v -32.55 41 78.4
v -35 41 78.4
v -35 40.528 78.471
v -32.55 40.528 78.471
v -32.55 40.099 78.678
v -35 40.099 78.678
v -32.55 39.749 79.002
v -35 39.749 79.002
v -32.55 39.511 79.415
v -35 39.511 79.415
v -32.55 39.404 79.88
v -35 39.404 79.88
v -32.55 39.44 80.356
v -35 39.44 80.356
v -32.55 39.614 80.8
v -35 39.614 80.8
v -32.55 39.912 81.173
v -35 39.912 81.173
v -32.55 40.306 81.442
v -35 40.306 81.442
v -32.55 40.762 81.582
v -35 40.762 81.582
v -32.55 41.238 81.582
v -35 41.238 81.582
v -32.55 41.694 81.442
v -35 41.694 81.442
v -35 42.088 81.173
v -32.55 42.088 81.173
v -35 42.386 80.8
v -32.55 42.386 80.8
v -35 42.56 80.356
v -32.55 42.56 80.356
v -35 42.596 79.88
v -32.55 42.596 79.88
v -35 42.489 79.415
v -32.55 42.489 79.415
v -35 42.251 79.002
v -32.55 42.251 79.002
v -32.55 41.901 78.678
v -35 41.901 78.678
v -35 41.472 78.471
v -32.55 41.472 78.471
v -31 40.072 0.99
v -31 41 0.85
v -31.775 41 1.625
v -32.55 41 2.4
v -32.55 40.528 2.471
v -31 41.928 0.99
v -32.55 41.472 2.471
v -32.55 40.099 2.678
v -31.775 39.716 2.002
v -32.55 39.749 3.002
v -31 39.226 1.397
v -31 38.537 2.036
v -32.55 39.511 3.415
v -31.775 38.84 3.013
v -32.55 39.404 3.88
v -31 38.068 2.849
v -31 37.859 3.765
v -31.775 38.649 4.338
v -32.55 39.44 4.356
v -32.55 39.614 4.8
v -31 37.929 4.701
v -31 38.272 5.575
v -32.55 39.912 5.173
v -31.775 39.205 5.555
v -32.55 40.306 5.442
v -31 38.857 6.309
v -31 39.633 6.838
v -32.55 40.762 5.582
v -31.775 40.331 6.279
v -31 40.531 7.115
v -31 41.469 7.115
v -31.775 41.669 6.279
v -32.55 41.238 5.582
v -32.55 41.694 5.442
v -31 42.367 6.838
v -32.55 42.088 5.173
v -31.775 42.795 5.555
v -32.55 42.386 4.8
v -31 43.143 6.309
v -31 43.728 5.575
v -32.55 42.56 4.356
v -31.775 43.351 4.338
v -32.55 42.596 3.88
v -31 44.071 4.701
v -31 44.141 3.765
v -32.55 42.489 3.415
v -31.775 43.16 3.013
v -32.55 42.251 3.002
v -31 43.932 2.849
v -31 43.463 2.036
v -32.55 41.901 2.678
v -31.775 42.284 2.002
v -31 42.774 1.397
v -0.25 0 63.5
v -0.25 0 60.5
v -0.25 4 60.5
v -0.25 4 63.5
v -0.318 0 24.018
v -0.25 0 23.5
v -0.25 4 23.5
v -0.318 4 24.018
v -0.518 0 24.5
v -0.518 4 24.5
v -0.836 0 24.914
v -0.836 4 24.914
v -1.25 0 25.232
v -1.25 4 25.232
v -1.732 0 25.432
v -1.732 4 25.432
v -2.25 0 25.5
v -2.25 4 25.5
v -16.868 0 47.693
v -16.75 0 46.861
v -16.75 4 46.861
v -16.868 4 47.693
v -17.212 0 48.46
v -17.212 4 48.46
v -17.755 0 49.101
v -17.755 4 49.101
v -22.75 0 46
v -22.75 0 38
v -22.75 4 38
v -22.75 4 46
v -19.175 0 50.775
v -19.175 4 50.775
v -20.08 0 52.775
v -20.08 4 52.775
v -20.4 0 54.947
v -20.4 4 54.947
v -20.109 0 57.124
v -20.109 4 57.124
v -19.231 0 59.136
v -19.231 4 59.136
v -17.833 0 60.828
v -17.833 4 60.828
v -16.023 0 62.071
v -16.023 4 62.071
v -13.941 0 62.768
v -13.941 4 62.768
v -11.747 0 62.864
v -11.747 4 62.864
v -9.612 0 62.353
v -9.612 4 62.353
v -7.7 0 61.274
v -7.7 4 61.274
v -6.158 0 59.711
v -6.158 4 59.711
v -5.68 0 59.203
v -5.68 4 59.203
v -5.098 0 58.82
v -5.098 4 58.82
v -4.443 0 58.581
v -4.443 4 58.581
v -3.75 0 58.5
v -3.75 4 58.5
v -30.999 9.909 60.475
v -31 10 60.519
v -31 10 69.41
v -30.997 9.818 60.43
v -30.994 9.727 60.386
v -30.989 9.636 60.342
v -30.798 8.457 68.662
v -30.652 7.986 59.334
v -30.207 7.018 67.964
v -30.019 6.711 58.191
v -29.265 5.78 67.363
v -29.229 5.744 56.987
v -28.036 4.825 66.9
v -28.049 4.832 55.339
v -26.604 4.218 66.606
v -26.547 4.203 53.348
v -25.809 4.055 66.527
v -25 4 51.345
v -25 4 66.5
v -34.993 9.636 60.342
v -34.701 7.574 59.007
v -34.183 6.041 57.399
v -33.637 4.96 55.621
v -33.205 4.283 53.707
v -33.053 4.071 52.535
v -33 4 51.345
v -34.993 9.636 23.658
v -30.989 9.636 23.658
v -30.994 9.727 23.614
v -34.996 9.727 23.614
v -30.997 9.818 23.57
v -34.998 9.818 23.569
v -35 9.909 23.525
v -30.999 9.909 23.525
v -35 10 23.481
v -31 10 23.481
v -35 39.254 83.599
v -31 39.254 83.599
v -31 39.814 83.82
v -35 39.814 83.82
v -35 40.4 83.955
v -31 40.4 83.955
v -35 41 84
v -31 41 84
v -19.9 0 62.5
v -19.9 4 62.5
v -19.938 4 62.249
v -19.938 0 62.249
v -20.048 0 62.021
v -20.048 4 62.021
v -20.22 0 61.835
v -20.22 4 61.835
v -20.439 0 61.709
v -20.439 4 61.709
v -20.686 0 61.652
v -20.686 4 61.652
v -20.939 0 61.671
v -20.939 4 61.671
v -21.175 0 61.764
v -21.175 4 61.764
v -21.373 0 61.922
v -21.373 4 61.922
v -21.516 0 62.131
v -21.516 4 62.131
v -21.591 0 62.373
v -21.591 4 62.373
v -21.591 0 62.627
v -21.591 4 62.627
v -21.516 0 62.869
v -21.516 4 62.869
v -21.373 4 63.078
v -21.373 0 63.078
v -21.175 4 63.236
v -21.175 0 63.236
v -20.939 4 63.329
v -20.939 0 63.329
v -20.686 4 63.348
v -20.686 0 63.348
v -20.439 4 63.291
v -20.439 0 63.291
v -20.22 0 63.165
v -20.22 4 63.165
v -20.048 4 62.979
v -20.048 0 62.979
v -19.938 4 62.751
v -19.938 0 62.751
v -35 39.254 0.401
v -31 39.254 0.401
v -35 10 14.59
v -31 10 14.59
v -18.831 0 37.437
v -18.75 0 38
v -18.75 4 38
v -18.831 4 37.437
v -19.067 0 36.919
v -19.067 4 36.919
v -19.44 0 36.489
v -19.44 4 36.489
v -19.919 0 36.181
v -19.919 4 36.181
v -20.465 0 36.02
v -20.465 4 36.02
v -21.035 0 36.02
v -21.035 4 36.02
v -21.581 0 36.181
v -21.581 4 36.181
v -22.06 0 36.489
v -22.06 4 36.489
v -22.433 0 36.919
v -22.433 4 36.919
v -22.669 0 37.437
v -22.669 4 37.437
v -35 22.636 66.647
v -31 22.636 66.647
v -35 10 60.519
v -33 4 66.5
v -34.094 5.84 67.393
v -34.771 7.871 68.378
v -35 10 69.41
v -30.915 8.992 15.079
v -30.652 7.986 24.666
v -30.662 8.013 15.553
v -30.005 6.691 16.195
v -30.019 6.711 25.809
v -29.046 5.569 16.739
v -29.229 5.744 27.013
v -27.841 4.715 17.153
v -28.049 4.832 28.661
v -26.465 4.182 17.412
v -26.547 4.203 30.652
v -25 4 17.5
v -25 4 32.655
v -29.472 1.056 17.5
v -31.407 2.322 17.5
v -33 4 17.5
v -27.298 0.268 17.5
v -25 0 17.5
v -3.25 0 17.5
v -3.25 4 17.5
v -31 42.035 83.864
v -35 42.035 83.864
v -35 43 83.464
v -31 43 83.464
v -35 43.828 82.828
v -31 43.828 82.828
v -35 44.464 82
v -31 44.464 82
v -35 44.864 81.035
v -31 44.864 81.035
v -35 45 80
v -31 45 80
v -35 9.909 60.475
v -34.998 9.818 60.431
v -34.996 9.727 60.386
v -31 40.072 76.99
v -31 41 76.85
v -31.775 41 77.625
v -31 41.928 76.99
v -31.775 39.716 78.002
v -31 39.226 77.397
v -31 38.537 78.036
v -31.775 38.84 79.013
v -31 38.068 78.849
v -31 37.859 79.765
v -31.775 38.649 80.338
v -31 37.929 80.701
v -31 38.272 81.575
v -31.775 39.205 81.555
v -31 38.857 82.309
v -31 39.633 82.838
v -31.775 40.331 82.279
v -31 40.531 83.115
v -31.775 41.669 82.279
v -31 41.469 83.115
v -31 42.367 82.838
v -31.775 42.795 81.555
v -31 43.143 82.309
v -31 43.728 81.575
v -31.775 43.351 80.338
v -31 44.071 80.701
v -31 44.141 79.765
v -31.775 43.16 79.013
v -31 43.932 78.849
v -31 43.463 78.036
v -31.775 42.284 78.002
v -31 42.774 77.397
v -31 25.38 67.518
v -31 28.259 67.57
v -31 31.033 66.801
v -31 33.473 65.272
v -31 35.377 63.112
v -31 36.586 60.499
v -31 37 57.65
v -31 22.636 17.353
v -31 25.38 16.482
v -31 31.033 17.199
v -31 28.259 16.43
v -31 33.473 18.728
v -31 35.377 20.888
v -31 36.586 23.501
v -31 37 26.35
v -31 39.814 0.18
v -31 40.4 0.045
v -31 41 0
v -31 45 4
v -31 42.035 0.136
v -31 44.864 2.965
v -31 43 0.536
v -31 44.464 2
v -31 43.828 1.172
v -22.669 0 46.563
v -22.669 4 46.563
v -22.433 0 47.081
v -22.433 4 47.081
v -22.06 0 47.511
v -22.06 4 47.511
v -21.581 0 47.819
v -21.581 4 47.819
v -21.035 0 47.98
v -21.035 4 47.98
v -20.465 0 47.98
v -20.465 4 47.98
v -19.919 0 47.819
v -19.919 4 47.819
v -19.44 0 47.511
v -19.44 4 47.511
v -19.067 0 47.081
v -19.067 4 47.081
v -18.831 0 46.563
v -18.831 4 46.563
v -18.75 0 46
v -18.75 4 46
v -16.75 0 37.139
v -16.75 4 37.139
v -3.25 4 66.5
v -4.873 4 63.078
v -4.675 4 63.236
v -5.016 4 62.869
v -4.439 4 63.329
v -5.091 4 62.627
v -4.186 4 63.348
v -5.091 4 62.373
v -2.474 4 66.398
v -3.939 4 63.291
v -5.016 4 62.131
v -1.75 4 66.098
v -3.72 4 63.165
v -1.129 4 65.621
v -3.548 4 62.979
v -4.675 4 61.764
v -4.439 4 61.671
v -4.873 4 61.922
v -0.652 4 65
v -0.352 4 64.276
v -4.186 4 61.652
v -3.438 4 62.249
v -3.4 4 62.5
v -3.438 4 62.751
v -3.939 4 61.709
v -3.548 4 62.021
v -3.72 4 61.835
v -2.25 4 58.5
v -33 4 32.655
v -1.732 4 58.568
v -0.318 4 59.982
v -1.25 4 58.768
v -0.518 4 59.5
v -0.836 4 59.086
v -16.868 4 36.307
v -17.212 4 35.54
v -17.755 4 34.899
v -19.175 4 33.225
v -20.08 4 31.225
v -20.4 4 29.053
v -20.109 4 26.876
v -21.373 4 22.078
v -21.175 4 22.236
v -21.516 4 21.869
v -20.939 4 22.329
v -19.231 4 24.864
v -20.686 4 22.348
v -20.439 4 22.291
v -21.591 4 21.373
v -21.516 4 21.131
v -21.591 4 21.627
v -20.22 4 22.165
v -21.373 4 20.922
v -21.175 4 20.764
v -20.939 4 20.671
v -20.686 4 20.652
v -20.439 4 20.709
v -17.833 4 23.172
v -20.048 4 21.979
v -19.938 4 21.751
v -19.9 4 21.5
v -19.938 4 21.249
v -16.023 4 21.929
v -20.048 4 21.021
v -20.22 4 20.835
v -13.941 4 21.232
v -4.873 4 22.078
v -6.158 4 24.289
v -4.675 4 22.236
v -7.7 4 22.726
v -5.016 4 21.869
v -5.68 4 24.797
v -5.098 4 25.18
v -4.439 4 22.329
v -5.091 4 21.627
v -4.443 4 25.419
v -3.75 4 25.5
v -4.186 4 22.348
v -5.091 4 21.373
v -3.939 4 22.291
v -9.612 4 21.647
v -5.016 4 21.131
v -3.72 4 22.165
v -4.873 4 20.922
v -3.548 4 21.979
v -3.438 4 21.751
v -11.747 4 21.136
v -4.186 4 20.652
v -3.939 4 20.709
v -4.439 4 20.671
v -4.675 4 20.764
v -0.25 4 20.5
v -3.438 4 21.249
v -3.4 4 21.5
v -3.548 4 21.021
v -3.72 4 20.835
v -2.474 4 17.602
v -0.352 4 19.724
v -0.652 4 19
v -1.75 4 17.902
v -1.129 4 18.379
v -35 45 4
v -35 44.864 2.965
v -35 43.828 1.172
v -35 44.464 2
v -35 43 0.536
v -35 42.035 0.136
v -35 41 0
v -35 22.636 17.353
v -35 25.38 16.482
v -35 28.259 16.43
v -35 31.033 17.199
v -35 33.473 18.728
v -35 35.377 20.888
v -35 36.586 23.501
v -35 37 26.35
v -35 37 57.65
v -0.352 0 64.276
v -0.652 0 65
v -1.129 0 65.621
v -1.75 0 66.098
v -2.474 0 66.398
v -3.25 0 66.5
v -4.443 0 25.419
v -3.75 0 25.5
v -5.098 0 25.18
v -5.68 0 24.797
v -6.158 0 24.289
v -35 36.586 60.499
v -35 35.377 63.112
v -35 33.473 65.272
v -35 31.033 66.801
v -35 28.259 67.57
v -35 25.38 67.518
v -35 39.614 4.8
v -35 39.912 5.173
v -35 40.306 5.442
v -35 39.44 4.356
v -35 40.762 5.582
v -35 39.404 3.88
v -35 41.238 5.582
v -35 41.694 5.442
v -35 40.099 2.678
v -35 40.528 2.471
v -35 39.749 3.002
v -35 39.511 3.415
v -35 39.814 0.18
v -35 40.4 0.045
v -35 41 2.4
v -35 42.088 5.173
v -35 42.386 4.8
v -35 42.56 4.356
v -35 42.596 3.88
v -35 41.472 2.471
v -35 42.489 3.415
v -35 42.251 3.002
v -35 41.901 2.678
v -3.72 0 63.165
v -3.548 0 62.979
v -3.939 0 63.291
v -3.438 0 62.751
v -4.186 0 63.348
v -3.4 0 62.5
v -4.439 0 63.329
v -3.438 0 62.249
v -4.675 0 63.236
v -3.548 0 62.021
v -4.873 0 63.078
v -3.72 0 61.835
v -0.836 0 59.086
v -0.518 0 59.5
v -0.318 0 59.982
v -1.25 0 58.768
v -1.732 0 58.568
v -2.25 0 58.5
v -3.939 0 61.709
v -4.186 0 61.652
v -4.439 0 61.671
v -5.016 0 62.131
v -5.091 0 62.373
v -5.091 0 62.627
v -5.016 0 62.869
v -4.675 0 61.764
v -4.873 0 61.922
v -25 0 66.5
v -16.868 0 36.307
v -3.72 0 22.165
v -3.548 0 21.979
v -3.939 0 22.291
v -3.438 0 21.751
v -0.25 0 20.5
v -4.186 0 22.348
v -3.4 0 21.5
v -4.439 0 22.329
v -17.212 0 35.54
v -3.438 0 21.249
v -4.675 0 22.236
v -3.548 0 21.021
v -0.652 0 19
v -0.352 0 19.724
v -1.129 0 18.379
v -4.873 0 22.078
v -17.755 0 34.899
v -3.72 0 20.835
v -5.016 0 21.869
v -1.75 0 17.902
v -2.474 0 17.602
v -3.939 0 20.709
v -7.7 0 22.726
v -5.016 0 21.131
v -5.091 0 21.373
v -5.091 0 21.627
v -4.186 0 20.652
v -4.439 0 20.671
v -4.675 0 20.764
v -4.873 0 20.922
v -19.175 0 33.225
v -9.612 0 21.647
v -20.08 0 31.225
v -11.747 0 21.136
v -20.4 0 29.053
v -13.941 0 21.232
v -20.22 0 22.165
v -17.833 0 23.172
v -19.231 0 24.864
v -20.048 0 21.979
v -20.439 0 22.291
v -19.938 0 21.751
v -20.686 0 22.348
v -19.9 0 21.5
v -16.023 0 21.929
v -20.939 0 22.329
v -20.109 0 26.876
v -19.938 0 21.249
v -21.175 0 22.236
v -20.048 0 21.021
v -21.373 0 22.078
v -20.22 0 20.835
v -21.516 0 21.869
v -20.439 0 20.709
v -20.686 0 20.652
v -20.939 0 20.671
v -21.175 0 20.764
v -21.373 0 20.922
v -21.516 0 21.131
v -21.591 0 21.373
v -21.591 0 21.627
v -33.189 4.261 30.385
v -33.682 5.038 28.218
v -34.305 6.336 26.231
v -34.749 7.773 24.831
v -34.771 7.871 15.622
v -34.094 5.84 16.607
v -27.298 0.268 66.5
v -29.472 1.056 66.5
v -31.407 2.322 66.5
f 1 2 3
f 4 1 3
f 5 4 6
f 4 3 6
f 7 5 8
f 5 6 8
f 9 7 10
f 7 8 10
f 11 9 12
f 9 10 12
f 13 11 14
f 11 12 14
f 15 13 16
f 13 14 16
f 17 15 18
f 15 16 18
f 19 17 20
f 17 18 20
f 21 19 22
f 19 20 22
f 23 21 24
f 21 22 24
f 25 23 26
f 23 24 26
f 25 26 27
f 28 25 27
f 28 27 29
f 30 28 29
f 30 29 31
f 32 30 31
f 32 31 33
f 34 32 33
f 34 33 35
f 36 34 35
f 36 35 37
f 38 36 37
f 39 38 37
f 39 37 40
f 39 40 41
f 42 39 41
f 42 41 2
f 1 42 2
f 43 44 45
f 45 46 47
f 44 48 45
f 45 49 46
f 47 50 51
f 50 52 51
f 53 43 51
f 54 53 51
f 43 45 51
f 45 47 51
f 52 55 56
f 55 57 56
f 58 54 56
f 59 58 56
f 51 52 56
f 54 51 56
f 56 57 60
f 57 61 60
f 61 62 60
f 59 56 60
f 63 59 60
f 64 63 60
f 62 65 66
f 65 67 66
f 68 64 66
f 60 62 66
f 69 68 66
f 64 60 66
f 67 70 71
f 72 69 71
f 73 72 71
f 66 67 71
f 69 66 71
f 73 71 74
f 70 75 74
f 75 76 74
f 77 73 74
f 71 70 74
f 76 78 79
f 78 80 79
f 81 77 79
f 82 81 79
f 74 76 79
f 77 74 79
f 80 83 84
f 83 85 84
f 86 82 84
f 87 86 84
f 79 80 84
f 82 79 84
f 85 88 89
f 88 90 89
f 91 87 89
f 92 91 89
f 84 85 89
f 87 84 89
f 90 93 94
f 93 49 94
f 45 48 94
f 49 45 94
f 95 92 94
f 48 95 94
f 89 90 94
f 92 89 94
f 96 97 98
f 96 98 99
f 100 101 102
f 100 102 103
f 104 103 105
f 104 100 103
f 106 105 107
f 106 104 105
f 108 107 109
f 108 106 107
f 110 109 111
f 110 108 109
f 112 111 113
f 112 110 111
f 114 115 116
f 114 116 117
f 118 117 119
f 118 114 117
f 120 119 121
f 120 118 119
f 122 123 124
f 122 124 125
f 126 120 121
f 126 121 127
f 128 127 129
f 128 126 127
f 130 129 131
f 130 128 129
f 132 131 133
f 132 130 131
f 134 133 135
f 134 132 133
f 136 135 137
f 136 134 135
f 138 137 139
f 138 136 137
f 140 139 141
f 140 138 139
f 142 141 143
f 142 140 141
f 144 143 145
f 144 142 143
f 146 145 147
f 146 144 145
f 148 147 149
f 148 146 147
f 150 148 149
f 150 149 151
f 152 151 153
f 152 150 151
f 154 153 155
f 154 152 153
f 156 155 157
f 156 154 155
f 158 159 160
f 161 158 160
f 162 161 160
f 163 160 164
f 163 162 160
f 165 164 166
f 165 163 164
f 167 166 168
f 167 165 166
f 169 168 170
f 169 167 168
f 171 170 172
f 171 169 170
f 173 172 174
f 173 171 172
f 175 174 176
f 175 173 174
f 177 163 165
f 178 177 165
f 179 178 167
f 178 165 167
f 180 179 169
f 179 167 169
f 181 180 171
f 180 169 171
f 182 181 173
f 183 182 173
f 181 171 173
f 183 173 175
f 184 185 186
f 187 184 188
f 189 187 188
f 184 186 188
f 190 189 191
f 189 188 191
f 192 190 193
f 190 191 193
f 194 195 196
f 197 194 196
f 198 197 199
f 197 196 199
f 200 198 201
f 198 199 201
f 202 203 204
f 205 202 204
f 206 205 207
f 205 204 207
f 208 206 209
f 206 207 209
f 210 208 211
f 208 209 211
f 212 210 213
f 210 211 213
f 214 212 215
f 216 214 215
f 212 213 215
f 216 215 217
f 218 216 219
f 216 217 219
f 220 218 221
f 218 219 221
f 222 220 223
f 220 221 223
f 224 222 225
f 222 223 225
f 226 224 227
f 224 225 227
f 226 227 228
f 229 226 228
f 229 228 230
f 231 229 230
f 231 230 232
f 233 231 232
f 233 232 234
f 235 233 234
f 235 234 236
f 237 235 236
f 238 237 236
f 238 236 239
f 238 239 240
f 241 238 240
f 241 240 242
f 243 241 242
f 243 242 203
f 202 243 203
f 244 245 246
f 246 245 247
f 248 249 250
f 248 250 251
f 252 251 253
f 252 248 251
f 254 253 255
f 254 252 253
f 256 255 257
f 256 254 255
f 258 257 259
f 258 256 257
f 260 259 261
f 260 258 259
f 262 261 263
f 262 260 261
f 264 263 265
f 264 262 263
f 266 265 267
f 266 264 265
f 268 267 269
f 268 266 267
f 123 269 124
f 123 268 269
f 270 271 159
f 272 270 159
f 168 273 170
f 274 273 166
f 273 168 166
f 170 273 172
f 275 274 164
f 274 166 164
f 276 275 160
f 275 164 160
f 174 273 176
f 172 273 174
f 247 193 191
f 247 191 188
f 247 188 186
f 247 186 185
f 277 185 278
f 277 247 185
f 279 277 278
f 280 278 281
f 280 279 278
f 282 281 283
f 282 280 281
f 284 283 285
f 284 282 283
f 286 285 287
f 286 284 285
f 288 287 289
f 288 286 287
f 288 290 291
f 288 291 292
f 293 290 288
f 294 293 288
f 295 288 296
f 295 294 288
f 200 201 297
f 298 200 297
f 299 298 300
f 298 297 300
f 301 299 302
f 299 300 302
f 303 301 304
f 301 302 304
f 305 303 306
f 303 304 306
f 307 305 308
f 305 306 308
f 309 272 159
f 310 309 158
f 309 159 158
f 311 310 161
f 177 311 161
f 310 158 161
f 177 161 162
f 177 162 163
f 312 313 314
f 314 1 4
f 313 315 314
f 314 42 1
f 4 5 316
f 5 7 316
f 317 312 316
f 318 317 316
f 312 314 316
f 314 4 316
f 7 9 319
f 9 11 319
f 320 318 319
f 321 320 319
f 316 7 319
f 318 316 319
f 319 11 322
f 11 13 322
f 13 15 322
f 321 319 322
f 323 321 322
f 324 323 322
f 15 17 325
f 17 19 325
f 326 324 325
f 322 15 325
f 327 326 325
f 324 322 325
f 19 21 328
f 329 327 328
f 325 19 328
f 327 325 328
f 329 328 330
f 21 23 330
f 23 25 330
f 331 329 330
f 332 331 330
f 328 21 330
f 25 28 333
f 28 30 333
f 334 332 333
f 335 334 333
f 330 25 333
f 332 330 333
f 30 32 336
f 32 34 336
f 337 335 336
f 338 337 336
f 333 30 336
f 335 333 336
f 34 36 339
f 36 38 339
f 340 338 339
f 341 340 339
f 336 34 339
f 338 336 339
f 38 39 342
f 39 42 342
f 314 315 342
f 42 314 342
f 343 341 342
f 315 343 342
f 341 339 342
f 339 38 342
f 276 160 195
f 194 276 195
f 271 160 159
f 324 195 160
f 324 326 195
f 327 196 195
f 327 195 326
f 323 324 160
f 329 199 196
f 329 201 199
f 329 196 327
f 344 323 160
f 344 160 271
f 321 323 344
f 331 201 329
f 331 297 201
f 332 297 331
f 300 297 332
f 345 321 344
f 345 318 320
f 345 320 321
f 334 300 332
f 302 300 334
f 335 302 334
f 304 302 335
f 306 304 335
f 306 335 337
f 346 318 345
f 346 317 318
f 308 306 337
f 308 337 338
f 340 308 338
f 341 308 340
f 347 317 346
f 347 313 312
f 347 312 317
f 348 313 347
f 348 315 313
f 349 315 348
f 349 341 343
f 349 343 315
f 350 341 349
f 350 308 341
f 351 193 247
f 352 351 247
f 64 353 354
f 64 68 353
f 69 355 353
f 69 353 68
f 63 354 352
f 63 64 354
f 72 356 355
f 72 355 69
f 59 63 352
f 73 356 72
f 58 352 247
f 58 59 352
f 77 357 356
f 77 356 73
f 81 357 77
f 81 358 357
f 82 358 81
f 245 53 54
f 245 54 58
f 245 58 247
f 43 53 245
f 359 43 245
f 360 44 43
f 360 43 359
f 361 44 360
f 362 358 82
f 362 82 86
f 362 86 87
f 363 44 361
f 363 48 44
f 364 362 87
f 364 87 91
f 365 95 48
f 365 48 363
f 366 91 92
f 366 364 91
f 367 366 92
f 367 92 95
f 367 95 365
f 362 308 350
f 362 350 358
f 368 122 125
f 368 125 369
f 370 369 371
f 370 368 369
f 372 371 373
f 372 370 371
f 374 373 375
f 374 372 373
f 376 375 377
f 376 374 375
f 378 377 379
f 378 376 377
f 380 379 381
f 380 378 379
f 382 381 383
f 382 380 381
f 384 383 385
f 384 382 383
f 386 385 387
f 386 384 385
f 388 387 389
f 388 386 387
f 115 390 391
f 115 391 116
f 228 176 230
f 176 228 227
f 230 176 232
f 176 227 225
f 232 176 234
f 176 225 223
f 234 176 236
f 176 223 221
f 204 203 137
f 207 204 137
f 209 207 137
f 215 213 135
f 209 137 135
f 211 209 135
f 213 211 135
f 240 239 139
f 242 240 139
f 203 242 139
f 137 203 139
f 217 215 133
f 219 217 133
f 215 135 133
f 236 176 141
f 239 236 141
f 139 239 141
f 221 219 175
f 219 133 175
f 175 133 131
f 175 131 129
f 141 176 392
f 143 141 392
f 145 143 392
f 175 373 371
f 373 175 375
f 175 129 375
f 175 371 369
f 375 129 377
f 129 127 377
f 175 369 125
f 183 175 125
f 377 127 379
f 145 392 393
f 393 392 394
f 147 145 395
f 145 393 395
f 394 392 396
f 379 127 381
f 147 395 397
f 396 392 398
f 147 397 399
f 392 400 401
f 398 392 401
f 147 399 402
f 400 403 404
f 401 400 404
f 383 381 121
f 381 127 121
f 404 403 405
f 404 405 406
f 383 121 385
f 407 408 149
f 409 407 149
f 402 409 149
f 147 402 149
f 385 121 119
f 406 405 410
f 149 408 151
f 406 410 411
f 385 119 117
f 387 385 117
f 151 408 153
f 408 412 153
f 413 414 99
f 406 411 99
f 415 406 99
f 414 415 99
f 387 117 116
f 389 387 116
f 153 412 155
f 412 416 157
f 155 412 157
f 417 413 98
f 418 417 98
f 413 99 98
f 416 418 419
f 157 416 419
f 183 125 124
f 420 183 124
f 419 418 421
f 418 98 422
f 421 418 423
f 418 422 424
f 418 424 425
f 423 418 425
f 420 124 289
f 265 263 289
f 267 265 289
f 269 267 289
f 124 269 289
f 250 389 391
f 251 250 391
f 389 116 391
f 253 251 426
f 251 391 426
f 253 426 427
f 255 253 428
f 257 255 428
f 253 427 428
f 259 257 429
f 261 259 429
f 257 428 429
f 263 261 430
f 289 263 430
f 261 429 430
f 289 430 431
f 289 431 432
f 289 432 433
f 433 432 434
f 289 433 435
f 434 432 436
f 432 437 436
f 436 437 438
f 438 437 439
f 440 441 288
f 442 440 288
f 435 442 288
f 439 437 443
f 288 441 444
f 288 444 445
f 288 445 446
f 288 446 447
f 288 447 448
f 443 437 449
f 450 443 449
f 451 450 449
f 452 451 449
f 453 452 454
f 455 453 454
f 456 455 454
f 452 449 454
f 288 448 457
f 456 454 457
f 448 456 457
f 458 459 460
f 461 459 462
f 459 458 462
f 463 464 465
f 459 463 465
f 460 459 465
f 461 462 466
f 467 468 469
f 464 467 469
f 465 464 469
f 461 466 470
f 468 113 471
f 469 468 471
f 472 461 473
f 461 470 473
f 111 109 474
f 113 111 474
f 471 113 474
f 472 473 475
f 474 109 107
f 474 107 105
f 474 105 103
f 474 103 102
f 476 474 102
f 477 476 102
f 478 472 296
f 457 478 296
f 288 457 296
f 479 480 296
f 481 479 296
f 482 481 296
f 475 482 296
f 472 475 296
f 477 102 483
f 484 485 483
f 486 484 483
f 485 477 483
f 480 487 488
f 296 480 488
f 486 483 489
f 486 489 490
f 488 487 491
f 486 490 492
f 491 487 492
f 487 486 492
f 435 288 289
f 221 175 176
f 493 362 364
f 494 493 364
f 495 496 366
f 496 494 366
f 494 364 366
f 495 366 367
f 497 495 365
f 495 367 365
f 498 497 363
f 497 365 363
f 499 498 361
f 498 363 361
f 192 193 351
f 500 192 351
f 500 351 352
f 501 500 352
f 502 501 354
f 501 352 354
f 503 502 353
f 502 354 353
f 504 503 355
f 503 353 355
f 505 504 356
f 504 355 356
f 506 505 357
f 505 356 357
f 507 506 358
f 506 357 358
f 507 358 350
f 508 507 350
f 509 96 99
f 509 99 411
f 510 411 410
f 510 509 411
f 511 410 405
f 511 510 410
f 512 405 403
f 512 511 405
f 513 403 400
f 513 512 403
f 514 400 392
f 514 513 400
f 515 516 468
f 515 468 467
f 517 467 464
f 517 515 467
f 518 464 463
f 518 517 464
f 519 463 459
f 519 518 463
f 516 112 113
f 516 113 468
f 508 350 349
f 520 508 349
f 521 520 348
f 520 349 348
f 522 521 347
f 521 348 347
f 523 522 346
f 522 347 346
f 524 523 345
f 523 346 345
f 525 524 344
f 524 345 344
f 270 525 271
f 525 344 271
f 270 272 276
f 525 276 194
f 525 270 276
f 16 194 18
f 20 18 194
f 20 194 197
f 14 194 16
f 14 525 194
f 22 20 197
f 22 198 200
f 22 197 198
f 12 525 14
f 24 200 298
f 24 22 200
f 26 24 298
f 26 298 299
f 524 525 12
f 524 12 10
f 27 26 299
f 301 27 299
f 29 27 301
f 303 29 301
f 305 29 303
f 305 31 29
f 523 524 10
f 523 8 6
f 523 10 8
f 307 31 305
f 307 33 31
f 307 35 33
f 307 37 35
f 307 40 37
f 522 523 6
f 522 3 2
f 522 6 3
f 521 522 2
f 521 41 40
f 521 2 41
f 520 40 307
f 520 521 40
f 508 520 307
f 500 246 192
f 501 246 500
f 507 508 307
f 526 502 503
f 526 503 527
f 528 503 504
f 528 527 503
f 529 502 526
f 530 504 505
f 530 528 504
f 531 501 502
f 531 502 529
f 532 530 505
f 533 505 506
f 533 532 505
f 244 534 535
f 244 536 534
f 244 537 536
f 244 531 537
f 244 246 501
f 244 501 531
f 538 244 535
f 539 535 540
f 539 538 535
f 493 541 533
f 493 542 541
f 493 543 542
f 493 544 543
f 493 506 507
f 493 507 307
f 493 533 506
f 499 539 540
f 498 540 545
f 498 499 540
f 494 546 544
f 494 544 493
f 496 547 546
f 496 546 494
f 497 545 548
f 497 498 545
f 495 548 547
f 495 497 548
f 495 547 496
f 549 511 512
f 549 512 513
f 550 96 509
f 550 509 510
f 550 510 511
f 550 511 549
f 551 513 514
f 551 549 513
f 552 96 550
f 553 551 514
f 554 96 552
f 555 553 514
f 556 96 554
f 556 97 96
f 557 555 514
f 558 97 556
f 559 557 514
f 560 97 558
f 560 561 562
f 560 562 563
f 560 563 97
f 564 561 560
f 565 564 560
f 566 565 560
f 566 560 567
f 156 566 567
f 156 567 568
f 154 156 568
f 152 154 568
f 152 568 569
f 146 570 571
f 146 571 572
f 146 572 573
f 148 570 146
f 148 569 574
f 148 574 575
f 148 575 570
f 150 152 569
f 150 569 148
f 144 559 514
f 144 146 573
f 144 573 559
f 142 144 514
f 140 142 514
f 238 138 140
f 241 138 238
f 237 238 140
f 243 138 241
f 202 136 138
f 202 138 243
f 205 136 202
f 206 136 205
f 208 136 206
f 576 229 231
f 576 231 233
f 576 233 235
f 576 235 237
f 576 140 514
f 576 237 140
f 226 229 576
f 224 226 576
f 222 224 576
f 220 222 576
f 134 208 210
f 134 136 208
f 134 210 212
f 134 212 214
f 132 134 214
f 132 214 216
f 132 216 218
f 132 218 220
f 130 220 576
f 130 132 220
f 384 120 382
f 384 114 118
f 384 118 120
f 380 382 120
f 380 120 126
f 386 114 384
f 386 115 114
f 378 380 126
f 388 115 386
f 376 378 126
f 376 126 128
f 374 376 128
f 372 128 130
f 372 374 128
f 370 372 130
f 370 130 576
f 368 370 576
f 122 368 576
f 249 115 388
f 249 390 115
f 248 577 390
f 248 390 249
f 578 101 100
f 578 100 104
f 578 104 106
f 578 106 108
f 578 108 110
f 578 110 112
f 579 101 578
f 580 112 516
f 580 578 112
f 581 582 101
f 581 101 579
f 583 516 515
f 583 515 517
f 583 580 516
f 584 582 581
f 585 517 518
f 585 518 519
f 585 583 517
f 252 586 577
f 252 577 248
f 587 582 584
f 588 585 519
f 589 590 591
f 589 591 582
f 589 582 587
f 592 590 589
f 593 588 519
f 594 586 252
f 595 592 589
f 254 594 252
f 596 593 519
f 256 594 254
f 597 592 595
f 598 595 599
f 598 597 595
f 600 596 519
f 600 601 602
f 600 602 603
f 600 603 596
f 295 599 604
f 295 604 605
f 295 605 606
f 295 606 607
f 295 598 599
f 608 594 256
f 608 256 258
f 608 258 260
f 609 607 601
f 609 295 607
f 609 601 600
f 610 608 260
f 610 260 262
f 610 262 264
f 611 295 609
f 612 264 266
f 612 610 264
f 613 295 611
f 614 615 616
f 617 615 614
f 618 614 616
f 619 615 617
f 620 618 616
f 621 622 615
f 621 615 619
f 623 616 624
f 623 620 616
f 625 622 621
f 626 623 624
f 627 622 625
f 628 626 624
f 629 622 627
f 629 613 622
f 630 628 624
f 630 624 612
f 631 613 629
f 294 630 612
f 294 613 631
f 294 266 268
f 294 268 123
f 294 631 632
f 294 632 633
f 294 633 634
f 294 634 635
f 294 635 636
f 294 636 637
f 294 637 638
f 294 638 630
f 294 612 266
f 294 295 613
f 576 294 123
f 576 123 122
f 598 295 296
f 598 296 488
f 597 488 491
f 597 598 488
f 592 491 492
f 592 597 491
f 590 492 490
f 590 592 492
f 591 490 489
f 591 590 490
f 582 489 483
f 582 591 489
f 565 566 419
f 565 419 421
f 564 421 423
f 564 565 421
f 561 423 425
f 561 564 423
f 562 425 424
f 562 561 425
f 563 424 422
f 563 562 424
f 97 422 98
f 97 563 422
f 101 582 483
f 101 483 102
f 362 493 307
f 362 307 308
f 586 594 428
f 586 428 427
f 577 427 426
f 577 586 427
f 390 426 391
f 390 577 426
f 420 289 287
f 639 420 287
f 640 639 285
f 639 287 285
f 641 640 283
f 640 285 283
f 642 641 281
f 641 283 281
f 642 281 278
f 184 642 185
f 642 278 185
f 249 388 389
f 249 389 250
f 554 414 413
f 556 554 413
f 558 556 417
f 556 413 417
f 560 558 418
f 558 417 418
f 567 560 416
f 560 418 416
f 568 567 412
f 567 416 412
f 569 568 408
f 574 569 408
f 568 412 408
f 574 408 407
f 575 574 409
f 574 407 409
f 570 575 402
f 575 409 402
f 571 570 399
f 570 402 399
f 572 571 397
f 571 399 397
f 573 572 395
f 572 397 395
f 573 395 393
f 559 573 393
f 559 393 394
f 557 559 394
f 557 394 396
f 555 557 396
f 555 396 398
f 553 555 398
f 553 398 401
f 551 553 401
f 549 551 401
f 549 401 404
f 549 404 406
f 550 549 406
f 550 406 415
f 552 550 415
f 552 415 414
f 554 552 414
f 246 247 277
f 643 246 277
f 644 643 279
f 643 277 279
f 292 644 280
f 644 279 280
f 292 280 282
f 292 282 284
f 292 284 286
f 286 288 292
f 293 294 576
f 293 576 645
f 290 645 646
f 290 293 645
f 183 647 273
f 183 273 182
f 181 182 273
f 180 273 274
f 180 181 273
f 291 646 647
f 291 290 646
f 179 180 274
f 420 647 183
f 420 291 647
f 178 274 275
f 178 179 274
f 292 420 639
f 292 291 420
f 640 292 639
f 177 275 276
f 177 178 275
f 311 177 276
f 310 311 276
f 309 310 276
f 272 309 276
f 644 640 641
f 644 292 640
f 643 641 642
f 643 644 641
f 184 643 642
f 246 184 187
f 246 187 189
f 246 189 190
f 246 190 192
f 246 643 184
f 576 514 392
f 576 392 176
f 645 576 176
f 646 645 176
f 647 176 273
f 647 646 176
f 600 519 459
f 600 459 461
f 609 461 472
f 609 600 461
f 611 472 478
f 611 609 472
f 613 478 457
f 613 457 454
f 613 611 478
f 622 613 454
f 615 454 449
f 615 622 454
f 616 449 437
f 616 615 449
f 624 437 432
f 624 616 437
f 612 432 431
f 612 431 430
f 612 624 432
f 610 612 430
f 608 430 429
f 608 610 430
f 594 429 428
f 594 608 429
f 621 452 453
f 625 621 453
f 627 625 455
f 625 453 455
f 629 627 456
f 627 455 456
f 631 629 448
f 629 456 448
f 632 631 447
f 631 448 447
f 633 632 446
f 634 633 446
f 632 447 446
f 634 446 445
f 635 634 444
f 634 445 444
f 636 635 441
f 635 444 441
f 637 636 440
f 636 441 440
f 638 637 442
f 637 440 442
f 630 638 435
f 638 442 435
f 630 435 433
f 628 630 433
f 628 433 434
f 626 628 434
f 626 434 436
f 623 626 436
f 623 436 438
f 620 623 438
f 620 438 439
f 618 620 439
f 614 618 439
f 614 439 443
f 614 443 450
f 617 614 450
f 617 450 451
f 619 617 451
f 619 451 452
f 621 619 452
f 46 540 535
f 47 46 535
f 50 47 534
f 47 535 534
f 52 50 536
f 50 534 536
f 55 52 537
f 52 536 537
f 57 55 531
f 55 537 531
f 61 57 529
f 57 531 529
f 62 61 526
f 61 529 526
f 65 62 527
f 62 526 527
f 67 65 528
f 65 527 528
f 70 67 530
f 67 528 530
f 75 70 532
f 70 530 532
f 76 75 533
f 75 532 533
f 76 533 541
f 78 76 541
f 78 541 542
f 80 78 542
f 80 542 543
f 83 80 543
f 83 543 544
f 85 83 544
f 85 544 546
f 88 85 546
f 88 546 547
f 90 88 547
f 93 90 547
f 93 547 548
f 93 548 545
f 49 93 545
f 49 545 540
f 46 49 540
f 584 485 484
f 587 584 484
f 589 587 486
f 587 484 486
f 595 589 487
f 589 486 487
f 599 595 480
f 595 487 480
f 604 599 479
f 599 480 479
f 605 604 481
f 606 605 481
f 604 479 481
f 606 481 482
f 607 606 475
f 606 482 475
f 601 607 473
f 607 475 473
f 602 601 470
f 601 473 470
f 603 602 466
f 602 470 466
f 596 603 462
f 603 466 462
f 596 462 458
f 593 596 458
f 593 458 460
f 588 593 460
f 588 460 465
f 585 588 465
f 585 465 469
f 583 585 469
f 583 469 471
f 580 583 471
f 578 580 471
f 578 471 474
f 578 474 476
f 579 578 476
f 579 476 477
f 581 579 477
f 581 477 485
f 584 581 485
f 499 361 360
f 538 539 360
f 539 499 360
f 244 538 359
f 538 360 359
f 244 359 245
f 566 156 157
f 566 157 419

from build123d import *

# Parameters (mm, degrees)
BOSS_EXTRU_1_DEPTH                             = 84
FRAISAGE_POUR_VIS_T_TE_FRAIS_E_M31_D           = 3.2
FRAISAGE_POUR_VIS_T_TE_FRAIS_E_M31_DEPTH       = 4
FRAISAGE_POUR_VIS_T_TE_FRAIS_E_M31_CSINK_D     = 6.3
FRAISAGE_POUR_VIS_T_TE_FRAIS_E_M31_CSINK_ANGLE = 90
D_GAGEMENT_M1_61_D                             = 1.7
D_GAGEMENT_M1_61_DEPTH                         = 4
ENL_V_MAT_EXTRU_1_DEPTH                        = 4
ENL_V_MAT_EXTRU_2_DEPTH                        = 31.75
ENL_V_MAT_EXTRU_2_DEPTH_BACK                   = 5


with BuildPart() as part:
    # Esquisse1 → Boss.-Extru.1 (new body)
    with BuildSketch(Plane.XY):
        with BuildLine():
            Line((0, 0), (-25, 0))
            ThreePointArc((-25, 0), (-32.071067812, 2.928932188), (-35, 10))
            Line((-35, 10), (-35, 45))
            Line((-35, 45), (-31, 45))
            Line((-31, 45), (-31, 10))
            ThreePointArc((-31, 10), (-29.242640687, 5.757359313), (-25, 4))
            Line((-25, 4), (0, 4))
            Line((0, 4), (0, 0))
        make_face()
    extrude(amount=BOSS_EXTRU_1_DEPTH)

    # Fraisage pour vis à tête fraisée M31
    with Locations(Plane(origin=(-31, 0, 0), x_dir=(0, 0, 1), z_dir=(1, 0, 0))):
        with Locations((4, -41), (80, -41)):
            CounterSinkHole(FRAISAGE_POUR_VIS_T_TE_FRAIS_E_M31_D / 2, FRAISAGE_POUR_VIS_T_TE_FRAIS_E_M31_CSINK_D / 2, depth=FRAISAGE_POUR_VIS_T_TE_FRAIS_E_M31_DEPTH, counter_sink_angle=FRAISAGE_POUR_VIS_T_TE_FRAIS_E_M31_CSINK_ANGLE)

    # Dégagement M1.61
    with Locations(Plane(origin=(0, 0, 0), x_dir=(-1, 0, 0), z_dir=(0, -1, 0))):
        with Locations((20.75, -21.5), (20.75, -62.5), (4.25, -62.5), (4.25, -21.5)):
            Hole(D_GAGEMENT_M1_61_D / 2, depth=D_GAGEMENT_M1_61_DEPTH)

    # Esquisse6 → Enlèv. mat.-Extru.1 (cut)
    with BuildSketch(Plane.XZ):
        with BuildLine():
            Line((-35, 17.5), (-3.25, 17.5))
            ThreePointArc((-3.25, 17.5), (-1.128679656, 18.378679656), (-0.25, 20.5))
            Line((-0.25, 20.5), (-0.25, 23.5))
            ThreePointArc((-0.25, 23.5), (-0.835786438, 24.914213562), (-2.25, 25.5))
            Line((-2.25, 25.5), (-3.750142858, 25.5))
            ThreePointArc((-3.750142858, 25.5), (-5.097923909, 25.180202649), (-6.15836042, 24.288990826))
            ThreePointArc((-6.15836042, 24.288990826), (-17.832822404, 23.171534919), (-17.754587156, 34.899094322))
            ThreePointArc((-17.754587156, 34.899094322), (-17.012643745, 35.911706018), (-16.75, 37.139256723))
            Line((-16.75, 37.139256723), (-16.75, 46.860743277))
            ThreePointArc((-16.75, 46.860743277), (-17.012643745, 48.088293982), (-17.754587156, 49.100905678))
            ThreePointArc((-17.754587156, 49.100905678), (-17.832822404, 60.828465081), (-6.15836042, 59.711009174))
            ThreePointArc((-6.15836042, 59.711009174), (-5.097923909, 58.819797351), (-3.750142858, 58.5))
            Line((-3.750142858, 58.5), (-2.25, 58.5))
            ThreePointArc((-2.25, 58.5), (-0.835786438, 59.085786438), (-0.25, 60.5))
            Line((-0.25, 60.5), (-0.25, 63.5))
            ThreePointArc((-0.25, 63.5), (-1.128679656, 65.621320344), (-3.25, 66.5))
            Line((-3.25, 66.5), (-35, 66.5))
            Line((-35, 66.5), (-35, 84))
            Line((-35, 84), (0, 84))
            Line((0, 84), (0, 0))
            Line((0, 0), (-35, 0))
            Line((-35, 0), (-35, 17.5))
        make_face()
        with BuildLine():
            Line((-18.75, 46), (-18.75, 38))
            ThreePointArc((-18.75, 38), (-20.75, 36), (-22.75, 38))
            Line((-22.75, 38), (-22.75, 46))
            ThreePointArc((-22.75, 46), (-20.75, 48), (-18.75, 46))
        make_face()
    extrude(amount=-ENL_V_MAT_EXTRU_1_DEPTH, mode=Mode.SUBTRACT)

    # Esquisse7 → Enlèv. mat.-Extru.2 (cut, two sides)
    with BuildSketch(Plane(origin=(-31, 0, 0), x_dir=(0, 0, -1), z_dir=(1, 0, 0))) as enl_v_mat_extru_2_sk:
        with BuildLine():
            Line((-60.518790495, 10), (-23.481209505, 10))
            Line((-23.481209505, 10), (-17.352509418, 22.636031611))
            ThreePointArc((-17.352509418, 22.636031611), (-17.875393601, 32.308498663), (-26.350052411, 37))
            Line((-26.350052411, 37), (-57.649947589, 37))
            ThreePointArc((-57.649947589, 37), (-66.124606399, 32.308498663), (-66.647490582, 22.636031611))
            Line((-66.647490582, 22.636031611), (-60.518790495, 10))
        make_face()
        with BuildLine():
            Line((-23.657740647, 9.636031611), (-23.481209505, 10))
            Line((-23.481209505, 10), (-60.518790495, 10))
            Line((-60.518790495, 10), (-60.342259353, 9.636031611))
            ThreePointArc((-60.342259353, 9.636031611), (-56.653215023, 5.52534119), (-51.34471636, 4))
            Line((-51.34471636, 4), (-32.65528364, 4))
            ThreePointArc((-32.65528364, 4), (-27.346784977, 5.52534119), (-23.657740647, 9.636031611))
        make_face()
        Polygon((0, 4), (0, 10), (-14.589893279, 10), (-17.5, 4), align=None)
        with BuildLine():
            Line((0, 10), (0, 41))
            ThreePointArc((0, 41), (-0.101534354, 40.104474676), (-0.400982803, 39.254412644))
            Line((-0.400982803, 39.254412644), (-14.589893279, 10))
            Line((-14.589893279, 10), (0, 10))
        make_face()
        with BuildLine():
            ThreePointArc((-4, 45), (-1.171572875, 43.828427125), (0, 41))
            Line((0, 41), (0, 45))
            Line((0, 45), (-4, 45))
        make_face()
        with BuildLine():
            ThreePointArc((-83.599017197, 39.254412644), (-83.898465646, 40.104474676), (-84, 41))
            Line((-84, 41), (-84, 10))
            Line((-84, 10), (-69.410106721, 10))
            Line((-69.410106721, 10), (-83.599017197, 39.254412644))
        make_face()
        Polygon((-69.410106721, 10), (-84, 10), (-84, 4), (-66.5, 4), align=None)
        with BuildLine():
            ThreePointArc((-84, 41), (-82.828427125, 43.828427125), (-80, 45))
            Line((-80, 45), (-84, 45))
            Line((-84, 45), (-84, 41))
        make_face()
    extrude(amount=ENL_V_MAT_EXTRU_2_DEPTH, mode=Mode.SUBTRACT)
    extrude(enl_v_mat_extru_2_sk.sketch, amount=-ENL_V_MAT_EXTRU_2_DEPTH_BACK, mode=Mode.SUBTRACT)


solid = part.part
